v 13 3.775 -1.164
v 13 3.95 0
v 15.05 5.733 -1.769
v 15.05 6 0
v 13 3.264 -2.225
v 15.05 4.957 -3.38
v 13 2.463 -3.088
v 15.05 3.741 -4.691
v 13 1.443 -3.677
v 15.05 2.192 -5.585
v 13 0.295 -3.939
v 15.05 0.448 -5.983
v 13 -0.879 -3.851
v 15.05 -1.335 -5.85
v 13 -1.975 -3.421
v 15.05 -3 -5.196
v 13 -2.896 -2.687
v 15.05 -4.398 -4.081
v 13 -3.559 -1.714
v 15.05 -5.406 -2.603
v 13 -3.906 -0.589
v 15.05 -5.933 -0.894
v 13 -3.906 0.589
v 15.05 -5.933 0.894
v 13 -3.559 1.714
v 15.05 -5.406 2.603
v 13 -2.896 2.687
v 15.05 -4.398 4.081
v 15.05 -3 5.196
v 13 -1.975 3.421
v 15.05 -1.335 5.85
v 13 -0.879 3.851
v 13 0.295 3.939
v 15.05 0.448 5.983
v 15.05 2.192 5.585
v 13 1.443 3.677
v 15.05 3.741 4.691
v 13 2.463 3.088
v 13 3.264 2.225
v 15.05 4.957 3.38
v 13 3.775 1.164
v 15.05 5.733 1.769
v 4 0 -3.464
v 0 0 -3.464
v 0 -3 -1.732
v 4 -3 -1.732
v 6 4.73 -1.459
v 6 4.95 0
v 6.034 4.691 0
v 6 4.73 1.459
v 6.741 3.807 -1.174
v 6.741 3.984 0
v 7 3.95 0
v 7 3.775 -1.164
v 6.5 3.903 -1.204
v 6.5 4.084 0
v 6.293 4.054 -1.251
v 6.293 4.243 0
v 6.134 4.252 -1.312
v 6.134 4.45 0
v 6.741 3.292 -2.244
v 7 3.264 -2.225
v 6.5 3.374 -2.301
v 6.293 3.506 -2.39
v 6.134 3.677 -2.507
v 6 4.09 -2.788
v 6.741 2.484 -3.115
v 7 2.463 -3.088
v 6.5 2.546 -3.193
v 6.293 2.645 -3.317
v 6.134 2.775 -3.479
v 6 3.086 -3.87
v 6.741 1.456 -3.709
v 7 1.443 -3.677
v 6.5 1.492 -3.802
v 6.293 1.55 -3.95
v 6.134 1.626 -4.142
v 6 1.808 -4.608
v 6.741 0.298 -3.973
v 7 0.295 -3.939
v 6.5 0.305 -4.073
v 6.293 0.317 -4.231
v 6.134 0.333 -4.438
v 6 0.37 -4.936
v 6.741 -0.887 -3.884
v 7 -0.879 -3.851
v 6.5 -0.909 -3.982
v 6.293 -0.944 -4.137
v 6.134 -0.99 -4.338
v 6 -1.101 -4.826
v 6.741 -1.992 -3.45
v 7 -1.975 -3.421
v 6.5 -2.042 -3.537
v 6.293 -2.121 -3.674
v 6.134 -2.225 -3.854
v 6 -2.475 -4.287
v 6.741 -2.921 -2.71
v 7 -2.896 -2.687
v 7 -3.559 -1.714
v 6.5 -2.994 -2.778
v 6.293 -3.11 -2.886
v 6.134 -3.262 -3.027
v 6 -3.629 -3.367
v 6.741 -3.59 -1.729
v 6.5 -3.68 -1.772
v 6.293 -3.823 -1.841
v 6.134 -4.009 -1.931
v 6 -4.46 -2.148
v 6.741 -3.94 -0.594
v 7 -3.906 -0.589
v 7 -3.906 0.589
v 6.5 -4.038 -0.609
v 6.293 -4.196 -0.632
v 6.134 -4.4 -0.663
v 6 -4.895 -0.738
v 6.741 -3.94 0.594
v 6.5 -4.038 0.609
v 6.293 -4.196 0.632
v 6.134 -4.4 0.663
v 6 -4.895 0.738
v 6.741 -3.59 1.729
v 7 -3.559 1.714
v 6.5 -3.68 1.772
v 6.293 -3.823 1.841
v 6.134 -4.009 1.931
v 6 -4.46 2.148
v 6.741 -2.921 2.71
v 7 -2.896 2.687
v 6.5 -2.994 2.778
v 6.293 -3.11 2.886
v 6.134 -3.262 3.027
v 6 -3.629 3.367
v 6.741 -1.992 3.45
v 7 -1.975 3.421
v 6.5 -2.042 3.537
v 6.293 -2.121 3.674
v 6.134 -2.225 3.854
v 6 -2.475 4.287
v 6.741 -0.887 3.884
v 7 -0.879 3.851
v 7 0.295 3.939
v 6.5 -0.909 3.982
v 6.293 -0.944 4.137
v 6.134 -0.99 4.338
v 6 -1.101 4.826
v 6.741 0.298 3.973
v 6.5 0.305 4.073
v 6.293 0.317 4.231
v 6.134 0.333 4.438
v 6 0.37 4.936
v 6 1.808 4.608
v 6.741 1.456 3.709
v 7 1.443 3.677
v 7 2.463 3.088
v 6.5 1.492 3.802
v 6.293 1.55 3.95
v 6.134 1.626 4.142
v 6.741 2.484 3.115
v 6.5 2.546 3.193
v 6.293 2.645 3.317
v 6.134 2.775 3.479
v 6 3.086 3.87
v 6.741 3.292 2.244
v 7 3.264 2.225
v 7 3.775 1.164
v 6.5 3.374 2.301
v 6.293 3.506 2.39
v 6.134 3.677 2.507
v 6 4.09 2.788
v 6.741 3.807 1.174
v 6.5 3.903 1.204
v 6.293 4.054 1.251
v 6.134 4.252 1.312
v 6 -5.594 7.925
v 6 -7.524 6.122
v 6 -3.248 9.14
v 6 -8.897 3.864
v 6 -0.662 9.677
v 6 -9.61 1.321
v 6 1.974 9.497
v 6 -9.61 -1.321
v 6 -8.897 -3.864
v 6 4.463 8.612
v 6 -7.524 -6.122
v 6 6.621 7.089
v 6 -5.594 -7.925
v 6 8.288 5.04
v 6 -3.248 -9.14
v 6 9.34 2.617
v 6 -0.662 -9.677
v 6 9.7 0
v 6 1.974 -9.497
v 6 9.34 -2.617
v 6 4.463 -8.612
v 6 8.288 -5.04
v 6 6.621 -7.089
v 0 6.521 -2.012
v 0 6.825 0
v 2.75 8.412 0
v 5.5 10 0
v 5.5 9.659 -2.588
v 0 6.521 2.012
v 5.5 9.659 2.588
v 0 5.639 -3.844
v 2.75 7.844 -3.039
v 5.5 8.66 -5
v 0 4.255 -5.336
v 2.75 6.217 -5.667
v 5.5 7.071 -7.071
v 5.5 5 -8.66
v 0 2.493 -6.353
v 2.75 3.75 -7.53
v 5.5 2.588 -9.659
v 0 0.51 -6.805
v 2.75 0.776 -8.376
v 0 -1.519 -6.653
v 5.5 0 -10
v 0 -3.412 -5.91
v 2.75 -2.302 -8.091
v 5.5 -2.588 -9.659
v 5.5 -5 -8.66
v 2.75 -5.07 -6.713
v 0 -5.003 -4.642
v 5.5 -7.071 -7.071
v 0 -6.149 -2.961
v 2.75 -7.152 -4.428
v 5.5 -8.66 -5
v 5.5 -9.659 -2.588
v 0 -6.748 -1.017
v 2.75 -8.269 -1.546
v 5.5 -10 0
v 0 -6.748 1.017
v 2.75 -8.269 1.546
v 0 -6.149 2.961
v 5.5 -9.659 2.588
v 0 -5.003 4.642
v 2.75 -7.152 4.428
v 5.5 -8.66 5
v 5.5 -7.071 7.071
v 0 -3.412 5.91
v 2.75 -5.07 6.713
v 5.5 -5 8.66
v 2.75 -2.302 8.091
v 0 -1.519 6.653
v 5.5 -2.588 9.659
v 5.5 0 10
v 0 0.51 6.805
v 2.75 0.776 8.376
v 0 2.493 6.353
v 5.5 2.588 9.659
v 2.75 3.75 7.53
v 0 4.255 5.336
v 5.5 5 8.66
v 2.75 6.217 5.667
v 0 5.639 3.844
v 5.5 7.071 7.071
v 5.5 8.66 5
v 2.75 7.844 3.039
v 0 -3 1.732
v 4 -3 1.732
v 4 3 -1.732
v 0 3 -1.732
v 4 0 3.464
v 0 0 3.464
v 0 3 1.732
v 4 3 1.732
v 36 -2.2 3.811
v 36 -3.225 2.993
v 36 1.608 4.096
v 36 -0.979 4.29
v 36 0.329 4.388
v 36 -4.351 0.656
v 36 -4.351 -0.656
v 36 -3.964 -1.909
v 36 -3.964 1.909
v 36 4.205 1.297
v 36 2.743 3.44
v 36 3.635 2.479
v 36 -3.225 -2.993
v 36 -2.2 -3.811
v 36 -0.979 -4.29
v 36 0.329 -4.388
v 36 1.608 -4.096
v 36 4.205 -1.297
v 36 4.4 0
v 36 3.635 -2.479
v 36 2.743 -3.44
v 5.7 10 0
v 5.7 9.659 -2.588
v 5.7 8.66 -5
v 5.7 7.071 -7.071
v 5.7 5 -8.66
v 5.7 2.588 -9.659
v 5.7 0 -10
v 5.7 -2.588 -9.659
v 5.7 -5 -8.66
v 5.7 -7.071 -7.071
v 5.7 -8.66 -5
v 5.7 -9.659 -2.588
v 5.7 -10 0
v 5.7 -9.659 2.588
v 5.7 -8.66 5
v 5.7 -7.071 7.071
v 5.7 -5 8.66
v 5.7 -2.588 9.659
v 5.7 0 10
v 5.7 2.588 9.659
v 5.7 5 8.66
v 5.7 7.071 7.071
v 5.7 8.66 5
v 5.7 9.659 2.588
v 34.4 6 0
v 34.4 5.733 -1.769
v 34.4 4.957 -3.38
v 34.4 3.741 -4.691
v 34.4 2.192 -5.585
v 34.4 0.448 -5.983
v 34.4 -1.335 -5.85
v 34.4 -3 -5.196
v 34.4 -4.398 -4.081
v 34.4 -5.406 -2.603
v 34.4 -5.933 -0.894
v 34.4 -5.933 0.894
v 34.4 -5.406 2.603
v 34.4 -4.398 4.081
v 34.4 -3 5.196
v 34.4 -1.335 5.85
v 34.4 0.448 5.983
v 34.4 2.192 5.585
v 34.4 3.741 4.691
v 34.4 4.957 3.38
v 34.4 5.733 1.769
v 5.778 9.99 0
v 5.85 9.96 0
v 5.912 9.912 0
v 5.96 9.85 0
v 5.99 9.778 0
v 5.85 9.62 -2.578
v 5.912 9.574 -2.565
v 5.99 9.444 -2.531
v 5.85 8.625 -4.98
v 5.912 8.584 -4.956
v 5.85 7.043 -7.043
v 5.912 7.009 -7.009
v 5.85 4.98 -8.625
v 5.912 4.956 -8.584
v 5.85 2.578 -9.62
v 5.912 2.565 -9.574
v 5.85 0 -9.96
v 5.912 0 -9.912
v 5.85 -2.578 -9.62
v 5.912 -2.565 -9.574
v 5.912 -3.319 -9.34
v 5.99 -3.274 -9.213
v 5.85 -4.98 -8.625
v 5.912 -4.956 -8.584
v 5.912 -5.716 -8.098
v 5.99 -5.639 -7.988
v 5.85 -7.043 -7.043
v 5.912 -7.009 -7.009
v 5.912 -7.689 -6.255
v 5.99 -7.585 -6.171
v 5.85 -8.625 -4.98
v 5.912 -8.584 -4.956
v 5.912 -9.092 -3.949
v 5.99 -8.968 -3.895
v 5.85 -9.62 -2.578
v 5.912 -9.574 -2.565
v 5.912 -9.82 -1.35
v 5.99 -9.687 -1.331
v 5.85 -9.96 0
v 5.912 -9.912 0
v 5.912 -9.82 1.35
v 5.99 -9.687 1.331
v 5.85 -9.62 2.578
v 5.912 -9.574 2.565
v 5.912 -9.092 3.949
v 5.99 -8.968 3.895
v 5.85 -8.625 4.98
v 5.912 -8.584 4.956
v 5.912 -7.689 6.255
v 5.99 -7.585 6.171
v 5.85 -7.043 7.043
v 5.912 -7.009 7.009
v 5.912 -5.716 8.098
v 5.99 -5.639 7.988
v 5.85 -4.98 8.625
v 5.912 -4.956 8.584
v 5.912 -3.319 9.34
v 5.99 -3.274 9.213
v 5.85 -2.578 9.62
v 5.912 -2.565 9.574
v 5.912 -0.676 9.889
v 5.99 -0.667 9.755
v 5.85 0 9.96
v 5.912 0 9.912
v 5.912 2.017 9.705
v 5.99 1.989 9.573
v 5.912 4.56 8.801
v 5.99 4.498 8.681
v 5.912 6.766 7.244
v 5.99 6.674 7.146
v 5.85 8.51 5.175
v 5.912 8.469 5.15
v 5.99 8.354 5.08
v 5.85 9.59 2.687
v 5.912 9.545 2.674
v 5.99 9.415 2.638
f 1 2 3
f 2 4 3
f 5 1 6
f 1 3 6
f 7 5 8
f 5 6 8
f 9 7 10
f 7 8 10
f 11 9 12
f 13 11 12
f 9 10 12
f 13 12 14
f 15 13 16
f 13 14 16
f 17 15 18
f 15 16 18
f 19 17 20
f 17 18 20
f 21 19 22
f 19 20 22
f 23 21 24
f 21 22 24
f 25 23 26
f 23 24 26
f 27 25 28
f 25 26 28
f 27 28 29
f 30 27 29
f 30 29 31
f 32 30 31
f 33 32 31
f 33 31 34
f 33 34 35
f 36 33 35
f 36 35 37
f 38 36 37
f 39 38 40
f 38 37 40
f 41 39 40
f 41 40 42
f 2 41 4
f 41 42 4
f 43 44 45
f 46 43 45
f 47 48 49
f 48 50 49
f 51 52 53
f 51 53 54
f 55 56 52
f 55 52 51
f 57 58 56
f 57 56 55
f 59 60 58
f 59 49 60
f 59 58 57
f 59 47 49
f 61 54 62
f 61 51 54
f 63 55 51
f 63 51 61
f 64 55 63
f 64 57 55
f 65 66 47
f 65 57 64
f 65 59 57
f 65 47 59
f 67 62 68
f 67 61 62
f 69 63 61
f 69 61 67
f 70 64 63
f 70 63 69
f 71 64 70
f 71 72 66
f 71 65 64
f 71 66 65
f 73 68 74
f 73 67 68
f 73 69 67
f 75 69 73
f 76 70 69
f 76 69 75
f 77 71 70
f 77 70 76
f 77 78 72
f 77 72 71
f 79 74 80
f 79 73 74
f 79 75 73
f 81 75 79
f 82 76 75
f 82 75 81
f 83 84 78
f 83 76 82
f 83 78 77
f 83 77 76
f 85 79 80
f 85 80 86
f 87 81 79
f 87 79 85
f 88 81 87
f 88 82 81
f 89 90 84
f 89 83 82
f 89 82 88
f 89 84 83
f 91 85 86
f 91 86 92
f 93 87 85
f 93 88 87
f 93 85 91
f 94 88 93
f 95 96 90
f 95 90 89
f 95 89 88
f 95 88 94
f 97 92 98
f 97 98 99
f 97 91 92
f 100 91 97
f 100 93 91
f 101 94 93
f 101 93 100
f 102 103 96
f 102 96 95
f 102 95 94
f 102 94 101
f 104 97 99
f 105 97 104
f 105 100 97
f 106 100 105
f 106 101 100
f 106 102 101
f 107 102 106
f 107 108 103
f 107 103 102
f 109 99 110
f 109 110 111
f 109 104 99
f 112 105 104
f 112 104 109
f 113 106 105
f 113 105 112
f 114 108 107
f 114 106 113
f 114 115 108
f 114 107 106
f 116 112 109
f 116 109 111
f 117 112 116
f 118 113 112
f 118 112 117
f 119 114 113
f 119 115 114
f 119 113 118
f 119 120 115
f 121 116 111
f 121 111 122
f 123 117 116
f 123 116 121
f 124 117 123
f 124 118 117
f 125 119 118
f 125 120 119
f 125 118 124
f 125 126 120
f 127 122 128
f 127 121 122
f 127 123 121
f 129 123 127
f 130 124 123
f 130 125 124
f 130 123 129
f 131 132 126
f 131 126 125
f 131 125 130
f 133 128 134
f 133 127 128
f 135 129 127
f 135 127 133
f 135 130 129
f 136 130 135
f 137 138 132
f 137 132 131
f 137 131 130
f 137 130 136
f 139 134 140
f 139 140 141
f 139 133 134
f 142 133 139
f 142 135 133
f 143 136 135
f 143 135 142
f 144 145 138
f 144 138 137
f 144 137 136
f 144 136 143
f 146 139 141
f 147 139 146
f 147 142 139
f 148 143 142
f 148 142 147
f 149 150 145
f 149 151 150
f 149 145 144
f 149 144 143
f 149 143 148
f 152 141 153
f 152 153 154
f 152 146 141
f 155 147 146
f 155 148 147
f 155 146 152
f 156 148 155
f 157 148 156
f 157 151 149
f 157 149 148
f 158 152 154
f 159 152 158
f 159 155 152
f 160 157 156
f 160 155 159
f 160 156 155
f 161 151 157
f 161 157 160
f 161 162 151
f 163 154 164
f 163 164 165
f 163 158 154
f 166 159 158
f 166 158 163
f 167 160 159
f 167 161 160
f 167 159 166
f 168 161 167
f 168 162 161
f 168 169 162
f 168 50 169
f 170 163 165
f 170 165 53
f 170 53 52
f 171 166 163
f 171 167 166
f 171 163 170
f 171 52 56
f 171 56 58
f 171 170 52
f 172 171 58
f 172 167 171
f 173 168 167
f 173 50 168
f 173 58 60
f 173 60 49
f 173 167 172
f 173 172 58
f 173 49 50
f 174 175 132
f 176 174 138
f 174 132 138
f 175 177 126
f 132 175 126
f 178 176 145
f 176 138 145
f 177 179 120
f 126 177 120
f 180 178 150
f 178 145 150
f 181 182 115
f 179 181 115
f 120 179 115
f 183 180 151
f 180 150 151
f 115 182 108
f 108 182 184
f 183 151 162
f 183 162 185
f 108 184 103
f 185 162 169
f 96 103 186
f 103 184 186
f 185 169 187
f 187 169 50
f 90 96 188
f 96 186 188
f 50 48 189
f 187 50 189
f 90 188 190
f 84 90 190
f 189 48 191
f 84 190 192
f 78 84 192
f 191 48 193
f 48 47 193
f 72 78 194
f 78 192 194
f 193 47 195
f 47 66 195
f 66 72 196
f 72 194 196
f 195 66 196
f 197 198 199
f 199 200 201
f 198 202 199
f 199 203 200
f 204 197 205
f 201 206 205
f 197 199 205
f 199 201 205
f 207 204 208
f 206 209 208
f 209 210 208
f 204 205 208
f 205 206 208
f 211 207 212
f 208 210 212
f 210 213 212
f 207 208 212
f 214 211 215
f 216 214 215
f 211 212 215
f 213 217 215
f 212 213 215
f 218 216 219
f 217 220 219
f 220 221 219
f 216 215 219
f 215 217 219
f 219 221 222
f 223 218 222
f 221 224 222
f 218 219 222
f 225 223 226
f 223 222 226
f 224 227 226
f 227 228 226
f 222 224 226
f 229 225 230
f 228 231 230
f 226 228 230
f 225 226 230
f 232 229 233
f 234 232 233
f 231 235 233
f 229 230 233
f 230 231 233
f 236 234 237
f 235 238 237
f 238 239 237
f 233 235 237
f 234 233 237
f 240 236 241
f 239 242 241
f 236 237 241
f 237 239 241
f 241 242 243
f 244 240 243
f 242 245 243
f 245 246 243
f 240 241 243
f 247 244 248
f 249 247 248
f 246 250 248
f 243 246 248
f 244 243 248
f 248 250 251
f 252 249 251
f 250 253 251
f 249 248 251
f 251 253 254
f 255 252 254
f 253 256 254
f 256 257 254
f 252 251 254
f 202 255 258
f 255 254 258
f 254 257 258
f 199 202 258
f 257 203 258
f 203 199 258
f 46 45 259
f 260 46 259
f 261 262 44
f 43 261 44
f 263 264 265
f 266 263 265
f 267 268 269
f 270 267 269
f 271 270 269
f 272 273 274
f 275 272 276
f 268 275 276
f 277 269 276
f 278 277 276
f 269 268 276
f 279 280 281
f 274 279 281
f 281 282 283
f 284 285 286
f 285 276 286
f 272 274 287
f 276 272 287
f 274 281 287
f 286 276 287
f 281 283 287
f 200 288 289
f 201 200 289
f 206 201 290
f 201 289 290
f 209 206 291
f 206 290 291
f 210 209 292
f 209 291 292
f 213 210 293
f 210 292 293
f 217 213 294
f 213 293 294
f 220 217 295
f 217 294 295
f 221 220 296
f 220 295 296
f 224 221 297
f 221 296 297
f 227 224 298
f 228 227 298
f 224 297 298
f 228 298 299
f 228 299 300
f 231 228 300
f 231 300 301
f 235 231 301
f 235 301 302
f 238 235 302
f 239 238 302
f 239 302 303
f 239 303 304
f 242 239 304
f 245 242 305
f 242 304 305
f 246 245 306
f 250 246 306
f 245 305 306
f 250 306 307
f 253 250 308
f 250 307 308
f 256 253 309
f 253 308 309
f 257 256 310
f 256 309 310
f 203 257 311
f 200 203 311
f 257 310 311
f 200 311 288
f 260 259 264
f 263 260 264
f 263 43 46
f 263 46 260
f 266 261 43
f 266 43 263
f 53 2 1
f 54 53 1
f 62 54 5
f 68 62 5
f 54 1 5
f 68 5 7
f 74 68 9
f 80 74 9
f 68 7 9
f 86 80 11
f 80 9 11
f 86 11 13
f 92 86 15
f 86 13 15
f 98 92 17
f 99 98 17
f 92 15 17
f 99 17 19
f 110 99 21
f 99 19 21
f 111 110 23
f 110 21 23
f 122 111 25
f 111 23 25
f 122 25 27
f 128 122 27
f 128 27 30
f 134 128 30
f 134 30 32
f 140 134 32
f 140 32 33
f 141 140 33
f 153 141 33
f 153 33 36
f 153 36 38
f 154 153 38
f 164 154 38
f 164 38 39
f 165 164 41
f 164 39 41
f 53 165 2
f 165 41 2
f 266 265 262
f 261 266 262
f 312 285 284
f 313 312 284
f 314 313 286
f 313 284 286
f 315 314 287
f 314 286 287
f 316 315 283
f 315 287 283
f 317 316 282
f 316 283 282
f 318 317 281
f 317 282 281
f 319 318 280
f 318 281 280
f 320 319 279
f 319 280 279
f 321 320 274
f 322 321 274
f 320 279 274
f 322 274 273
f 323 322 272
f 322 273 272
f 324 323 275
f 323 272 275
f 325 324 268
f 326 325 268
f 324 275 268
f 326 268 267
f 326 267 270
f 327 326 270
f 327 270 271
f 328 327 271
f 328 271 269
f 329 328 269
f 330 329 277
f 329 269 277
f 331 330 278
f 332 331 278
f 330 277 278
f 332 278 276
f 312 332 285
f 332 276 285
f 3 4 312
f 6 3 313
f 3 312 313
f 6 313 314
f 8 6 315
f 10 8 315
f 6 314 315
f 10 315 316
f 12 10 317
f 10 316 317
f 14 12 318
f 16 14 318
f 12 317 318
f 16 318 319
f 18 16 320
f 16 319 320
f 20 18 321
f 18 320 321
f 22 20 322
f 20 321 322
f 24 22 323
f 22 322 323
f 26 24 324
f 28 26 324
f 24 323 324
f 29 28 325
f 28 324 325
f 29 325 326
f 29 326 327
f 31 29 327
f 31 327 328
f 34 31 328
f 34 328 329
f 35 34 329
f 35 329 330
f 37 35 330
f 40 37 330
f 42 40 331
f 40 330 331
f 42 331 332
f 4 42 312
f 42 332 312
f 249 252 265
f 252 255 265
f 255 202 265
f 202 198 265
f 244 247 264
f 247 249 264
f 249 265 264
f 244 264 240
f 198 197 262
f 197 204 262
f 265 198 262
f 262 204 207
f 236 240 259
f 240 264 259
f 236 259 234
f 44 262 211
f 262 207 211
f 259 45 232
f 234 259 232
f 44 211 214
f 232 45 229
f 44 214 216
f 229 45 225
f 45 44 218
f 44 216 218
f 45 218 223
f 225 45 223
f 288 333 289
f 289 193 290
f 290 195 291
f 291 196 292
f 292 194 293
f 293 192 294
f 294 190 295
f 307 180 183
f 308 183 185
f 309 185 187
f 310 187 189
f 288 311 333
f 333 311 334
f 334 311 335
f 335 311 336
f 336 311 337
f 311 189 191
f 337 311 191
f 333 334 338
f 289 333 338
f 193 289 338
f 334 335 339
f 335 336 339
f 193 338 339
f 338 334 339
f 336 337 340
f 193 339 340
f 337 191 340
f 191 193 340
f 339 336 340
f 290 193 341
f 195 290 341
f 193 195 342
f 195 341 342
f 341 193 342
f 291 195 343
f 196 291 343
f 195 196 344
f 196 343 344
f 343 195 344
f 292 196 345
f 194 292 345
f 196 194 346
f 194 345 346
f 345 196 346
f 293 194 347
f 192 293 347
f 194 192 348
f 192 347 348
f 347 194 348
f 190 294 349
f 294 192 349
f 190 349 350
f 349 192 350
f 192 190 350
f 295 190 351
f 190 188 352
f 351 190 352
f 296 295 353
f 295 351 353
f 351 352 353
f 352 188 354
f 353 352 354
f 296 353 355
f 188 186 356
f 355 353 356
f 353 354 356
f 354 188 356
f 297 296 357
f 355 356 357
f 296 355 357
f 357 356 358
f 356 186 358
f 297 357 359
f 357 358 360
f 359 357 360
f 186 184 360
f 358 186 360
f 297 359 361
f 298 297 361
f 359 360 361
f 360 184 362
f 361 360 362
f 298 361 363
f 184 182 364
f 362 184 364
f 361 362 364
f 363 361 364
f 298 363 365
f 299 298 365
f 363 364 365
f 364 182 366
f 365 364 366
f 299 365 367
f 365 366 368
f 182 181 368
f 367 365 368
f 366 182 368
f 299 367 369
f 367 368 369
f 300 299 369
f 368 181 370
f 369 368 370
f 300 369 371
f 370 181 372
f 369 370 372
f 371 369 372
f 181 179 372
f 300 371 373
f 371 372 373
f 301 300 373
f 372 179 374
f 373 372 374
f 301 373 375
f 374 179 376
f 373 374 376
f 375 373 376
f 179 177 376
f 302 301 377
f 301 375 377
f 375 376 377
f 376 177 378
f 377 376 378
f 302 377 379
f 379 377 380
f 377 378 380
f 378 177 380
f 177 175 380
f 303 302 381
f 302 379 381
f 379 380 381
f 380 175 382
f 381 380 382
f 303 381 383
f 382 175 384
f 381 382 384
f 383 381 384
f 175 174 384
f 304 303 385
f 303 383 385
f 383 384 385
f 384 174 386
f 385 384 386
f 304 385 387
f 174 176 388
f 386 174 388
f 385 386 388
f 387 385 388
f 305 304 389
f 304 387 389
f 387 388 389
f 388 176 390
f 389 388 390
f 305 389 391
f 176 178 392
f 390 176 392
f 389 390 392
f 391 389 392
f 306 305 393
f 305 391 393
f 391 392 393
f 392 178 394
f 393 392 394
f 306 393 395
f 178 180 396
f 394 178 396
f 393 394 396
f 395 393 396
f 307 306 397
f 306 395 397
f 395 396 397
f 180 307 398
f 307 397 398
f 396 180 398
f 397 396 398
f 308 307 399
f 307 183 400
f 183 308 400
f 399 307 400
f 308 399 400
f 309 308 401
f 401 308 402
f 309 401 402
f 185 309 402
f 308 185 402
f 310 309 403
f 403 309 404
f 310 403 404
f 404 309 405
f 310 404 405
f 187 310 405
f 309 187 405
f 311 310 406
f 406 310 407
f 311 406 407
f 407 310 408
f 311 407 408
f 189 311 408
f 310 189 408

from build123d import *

# Parameters (mm, degrees)
CUT_EXTRUDE_1_DEPTH = 4
FILLET_1_R          = 0.3
CHAMFER_1_SIZE      = 1.6
FILLET_2_R          = 1


with BuildPart() as part:
    # Эскиз1 → Повернуть1 (revolve)
    with BuildSketch(Plane.XY):
        Polygon((0, 0), (0, 6.824573519), (5.5, 10), (6, 10), (6, 3.95), (13, 3.95), (15.05, 6), (36, 6), (36, 0), align=None)
    revolve(axis=Axis((36, 0, 0), (-1, 0, 0)))

    # Эскиз2 → Вырез-Вытянуть1 (cut)
    with BuildSketch(Plane.ZY):
        Polygon((1.732050808, 3), (-1.732050808, 3), (-3.464101615, 0), (-1.732050808, -3), (1.732050808, -3), (3.464101615, 0), align=None)
    extrude(amount=-CUT_EXTRUDE_1_DEPTH, mode=Mode.SUBTRACT)

    # Скругление1
    fillet_1_edges = [part.edges().sort_by_distance(p)[0] for p in [
        (6, -10, 0),
    ]]
    fillet(fillet_1_edges, radius=FILLET_1_R)

    # Фаска1
    chamfer_1_edges = [part.edges().sort_by_distance(p)[0] for p in [
        (36, -6, 0),
    ]]
    chamfer(chamfer_1_edges, length=CHAMFER_1_SIZE)

    # Скругление2
    fillet_2_edges = [part.edges().sort_by_distance(p)[0] for p in [
        (6, -3.95, 0),
    ]]
    fillet(fillet_2_edges, radius=FILLET_2_R)


solid = part.part
